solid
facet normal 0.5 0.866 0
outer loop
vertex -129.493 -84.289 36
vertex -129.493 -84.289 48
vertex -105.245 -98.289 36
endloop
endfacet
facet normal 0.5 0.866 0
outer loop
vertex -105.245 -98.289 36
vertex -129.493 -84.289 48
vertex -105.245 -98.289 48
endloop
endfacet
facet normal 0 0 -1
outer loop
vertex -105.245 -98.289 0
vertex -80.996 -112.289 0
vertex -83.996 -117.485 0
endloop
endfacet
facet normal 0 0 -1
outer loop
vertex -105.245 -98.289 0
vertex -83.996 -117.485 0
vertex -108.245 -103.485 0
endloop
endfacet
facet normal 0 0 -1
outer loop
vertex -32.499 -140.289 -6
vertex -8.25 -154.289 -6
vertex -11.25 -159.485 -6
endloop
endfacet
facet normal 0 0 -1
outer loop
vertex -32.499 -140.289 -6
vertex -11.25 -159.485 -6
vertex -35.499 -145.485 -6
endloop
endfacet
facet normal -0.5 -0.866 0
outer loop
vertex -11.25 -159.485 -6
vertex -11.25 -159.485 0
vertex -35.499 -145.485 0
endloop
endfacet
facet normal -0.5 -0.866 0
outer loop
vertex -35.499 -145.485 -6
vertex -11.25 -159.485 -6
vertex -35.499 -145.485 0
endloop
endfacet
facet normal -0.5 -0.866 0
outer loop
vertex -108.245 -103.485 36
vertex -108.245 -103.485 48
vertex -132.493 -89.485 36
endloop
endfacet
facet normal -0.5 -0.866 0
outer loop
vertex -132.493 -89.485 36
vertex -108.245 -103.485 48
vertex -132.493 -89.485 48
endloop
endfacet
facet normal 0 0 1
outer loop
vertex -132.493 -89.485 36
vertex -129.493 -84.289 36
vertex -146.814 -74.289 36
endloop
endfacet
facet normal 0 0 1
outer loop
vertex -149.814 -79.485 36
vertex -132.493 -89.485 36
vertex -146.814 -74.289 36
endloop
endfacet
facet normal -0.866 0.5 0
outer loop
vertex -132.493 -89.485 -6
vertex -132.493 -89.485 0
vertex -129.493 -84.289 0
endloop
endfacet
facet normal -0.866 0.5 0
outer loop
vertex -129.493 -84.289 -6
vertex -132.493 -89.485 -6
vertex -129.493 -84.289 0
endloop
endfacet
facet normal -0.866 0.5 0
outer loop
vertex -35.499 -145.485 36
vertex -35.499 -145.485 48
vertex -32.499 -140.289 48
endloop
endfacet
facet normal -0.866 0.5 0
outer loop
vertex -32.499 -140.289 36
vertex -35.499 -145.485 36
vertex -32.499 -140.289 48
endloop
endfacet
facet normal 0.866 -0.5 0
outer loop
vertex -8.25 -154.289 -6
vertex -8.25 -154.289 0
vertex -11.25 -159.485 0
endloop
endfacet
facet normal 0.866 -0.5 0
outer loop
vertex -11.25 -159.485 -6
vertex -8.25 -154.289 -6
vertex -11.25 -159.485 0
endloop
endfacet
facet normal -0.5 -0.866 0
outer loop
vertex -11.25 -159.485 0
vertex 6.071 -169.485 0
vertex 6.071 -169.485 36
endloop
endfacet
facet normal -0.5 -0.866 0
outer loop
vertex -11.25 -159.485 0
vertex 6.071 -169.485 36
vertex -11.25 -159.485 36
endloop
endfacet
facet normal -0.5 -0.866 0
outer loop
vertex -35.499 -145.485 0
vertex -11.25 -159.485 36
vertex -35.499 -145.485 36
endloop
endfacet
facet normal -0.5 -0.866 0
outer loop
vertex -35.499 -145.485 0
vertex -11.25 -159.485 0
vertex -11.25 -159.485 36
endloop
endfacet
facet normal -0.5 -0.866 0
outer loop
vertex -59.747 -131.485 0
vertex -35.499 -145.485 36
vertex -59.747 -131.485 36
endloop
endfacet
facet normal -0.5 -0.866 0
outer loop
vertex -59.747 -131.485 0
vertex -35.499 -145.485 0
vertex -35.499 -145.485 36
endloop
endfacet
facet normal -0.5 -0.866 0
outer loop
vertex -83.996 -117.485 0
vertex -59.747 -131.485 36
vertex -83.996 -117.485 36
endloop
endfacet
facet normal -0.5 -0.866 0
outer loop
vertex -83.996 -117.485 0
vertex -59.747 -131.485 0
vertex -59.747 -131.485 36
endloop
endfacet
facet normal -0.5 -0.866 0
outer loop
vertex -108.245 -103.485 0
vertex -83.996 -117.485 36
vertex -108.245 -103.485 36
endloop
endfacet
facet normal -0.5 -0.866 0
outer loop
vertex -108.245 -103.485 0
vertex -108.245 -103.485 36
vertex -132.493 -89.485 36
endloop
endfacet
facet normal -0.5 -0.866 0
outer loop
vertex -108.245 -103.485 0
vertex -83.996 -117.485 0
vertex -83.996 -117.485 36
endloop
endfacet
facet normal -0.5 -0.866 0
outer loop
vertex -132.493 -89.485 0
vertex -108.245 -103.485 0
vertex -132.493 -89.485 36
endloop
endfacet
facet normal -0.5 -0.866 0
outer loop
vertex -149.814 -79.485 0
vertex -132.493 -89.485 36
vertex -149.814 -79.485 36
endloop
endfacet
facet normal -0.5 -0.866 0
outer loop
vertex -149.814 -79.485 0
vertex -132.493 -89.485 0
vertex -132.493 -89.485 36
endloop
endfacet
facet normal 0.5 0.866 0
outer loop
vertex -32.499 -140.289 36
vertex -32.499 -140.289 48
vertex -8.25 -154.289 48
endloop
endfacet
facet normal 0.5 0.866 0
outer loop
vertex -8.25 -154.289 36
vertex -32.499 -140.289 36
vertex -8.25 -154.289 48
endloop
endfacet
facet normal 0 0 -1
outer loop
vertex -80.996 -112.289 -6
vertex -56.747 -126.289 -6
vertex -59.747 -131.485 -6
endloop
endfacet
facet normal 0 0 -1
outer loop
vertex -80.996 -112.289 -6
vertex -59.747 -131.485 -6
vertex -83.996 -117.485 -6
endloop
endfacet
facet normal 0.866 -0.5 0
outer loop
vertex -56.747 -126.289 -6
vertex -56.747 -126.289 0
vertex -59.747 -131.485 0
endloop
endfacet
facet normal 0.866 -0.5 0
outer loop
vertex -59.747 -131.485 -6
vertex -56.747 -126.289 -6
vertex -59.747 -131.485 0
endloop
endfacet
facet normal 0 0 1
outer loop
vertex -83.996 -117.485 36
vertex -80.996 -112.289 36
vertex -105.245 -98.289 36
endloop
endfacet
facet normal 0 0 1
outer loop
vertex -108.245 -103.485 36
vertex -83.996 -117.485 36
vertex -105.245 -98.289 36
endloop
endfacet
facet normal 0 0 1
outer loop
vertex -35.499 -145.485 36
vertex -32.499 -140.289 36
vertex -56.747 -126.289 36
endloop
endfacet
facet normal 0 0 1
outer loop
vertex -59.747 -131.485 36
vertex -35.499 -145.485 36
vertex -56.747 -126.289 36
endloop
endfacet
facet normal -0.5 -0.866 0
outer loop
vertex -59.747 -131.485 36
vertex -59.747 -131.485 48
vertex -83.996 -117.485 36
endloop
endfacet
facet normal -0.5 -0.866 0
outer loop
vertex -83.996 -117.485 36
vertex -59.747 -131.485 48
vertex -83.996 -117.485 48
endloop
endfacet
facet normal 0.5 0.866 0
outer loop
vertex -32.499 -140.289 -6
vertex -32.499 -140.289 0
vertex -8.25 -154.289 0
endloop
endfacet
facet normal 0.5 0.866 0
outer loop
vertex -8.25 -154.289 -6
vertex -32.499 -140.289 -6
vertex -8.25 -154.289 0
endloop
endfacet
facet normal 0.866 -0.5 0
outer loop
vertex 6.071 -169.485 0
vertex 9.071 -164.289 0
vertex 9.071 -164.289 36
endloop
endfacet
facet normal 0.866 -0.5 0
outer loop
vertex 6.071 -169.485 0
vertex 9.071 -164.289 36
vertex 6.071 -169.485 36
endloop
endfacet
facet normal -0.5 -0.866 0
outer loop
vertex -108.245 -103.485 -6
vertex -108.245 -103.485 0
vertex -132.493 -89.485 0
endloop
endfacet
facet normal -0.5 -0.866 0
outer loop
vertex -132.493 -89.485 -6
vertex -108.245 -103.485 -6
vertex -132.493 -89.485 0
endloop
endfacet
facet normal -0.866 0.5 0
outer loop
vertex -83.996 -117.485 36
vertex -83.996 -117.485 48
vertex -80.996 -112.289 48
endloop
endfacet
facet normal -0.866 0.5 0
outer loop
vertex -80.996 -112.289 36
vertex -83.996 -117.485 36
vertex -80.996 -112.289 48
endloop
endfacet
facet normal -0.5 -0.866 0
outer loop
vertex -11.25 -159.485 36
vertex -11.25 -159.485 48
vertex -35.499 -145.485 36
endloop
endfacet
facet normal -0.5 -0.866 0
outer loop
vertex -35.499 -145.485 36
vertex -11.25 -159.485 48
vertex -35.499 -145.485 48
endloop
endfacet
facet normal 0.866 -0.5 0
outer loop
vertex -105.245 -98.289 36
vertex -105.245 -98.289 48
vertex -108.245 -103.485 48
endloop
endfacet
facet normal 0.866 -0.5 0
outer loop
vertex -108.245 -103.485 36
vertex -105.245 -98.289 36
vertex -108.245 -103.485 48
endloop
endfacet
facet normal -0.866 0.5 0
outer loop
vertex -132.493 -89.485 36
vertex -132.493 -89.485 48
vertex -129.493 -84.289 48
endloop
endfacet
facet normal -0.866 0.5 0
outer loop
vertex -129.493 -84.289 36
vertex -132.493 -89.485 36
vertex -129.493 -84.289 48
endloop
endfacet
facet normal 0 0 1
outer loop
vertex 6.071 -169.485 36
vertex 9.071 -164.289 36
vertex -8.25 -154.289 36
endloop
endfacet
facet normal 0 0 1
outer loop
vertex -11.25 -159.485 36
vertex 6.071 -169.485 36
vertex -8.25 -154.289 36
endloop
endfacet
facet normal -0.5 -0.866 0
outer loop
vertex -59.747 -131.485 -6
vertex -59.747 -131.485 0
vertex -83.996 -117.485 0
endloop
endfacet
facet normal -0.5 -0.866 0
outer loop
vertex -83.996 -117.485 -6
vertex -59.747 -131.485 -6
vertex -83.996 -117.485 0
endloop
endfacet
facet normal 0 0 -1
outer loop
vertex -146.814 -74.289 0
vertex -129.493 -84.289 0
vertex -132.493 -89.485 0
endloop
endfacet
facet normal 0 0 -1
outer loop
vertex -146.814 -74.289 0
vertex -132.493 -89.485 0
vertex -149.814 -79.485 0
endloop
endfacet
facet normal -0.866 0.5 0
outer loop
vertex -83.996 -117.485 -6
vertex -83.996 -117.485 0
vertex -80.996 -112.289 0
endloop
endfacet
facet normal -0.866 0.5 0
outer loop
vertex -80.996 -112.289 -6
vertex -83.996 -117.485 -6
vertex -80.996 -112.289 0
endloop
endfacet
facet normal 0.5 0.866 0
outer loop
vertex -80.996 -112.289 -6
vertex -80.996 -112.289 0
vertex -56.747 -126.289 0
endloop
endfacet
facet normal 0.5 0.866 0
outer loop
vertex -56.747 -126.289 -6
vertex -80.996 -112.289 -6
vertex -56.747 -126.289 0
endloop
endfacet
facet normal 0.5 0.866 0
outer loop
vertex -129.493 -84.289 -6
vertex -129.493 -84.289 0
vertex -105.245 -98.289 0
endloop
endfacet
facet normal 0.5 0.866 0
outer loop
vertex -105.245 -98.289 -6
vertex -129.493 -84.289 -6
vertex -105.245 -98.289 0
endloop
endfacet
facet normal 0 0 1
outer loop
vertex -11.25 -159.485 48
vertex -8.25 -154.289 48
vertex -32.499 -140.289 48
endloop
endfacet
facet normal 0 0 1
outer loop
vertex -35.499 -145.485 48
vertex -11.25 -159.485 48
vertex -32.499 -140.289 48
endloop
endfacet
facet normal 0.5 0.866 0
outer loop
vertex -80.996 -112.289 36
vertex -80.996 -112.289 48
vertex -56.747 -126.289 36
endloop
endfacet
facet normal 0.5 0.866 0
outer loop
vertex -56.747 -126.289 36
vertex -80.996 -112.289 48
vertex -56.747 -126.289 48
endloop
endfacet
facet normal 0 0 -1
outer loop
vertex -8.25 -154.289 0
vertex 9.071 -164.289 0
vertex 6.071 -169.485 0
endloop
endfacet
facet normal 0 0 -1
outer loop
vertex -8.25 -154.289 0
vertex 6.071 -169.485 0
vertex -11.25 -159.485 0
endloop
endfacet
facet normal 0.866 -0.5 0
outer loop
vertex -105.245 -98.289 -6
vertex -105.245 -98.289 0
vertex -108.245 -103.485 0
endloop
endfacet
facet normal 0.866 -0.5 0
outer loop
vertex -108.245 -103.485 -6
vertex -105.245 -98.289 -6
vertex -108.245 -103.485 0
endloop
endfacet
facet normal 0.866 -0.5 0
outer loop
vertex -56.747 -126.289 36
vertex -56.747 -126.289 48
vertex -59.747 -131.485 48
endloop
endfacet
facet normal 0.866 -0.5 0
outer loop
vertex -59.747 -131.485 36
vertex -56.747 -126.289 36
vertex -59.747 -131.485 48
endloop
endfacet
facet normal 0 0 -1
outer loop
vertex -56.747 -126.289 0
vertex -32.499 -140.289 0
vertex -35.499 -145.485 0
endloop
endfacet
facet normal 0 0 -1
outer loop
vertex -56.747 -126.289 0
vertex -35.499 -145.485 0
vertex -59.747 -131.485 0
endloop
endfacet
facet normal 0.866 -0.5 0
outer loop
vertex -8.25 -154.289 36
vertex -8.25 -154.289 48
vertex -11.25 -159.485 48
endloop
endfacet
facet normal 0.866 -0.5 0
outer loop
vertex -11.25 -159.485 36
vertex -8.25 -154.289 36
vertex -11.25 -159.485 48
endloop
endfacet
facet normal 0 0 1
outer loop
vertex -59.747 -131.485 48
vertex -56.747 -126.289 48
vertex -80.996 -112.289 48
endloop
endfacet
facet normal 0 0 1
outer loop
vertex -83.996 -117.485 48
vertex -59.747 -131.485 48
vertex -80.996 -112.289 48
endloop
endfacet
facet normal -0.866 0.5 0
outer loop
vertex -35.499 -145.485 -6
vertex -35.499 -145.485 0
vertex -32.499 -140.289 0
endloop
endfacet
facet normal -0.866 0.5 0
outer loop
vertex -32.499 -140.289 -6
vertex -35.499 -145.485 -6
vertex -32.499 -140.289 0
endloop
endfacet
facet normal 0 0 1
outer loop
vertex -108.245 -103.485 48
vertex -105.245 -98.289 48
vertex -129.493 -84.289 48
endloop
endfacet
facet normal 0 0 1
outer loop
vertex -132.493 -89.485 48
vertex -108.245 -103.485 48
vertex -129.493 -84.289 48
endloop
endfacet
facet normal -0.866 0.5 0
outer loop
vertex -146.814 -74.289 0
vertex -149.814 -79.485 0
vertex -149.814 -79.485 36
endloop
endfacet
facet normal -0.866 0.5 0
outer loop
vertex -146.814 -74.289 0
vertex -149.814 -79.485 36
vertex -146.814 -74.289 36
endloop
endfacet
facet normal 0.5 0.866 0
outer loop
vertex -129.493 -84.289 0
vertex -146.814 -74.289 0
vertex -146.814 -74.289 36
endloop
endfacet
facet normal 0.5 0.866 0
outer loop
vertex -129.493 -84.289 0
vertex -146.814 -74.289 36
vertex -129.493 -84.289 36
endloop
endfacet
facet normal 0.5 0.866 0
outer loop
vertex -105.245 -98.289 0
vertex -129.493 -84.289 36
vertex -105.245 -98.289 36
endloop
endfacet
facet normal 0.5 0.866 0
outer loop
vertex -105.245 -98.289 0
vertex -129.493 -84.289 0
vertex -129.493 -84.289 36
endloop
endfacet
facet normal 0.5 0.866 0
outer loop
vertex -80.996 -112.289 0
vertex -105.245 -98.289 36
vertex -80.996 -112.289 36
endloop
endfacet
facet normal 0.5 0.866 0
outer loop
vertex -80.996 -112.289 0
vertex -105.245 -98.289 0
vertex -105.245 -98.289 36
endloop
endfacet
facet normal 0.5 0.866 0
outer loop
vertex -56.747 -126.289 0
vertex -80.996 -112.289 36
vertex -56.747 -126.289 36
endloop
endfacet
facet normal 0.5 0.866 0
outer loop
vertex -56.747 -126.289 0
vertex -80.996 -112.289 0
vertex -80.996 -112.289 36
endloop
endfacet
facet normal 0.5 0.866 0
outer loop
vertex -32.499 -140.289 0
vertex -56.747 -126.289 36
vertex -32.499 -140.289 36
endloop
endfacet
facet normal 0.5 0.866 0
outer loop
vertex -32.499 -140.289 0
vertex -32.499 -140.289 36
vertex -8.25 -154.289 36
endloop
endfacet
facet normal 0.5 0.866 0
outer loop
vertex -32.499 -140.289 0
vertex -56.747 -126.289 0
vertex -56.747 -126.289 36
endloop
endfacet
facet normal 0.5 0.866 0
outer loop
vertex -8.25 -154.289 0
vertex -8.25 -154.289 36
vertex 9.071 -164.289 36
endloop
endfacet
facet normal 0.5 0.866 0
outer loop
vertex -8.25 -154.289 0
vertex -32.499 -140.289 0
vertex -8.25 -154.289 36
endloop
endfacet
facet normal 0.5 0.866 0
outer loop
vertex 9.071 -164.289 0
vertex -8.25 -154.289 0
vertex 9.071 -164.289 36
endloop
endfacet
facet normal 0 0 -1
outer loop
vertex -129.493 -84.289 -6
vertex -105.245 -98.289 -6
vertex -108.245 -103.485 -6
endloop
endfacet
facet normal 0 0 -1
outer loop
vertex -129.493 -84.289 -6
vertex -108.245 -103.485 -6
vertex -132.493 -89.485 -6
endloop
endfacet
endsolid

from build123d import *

# Parameters (mm, degrees)
BOSS_EXTRU_1_DEPTH      = 36
BOSS_EXTRU_2_DEPTH      = 6
BOSS_EXTRU_2_DEPTH_BACK = 48


with BuildPart() as part:
    # Esquisse1 → Boss.-Extru.1 (new body)
    with BuildSketch(Plane.XY):
        Polygon((6.070596481, -169.485418462), (-149.8139762, -79.485418462), (-146.8139762, -74.28926604), (9.070596481, -164.28926604), align=None)
    extrude(amount=BOSS_EXTRU_1_DEPTH)

    # Esquisse3 → Boss.-Extru.2 (add, two sides: drawn at the far end of the back side and taken through both)
    with BuildSketch(Plane(origin=(0, 0, 0), x_dir=(-1, 0, 0), z_dir=(0, 0, -1)).offset(-BOSS_EXTRU_2_DEPTH_BACK)):
        Polygon((32.4986229, -140.28926604), (8.249911594, -154.28926604), (11.249911594, -159.485418462), (35.4986229, -145.485418462), align=None)
        Polygon((68.871689859, -119.28926604), (56.747334206, -126.28926604), (59.747334206, -131.485418462), (71.871689859, -124.485418462), align=None)
        Polygon((80.996045512, -112.28926604), (68.871689859, -119.28926604), (71.871689859, -124.485418462), (83.996045512, -117.485418462), align=None)
        Polygon((129.493468124, -84.28926604), (105.244756818, -98.28926604), (108.244756818, -103.485418462), (132.493468124, -89.485418462), align=None)
    extrude(amount=BOSS_EXTRU_2_DEPTH + BOSS_EXTRU_2_DEPTH_BACK)


solid = part.part
